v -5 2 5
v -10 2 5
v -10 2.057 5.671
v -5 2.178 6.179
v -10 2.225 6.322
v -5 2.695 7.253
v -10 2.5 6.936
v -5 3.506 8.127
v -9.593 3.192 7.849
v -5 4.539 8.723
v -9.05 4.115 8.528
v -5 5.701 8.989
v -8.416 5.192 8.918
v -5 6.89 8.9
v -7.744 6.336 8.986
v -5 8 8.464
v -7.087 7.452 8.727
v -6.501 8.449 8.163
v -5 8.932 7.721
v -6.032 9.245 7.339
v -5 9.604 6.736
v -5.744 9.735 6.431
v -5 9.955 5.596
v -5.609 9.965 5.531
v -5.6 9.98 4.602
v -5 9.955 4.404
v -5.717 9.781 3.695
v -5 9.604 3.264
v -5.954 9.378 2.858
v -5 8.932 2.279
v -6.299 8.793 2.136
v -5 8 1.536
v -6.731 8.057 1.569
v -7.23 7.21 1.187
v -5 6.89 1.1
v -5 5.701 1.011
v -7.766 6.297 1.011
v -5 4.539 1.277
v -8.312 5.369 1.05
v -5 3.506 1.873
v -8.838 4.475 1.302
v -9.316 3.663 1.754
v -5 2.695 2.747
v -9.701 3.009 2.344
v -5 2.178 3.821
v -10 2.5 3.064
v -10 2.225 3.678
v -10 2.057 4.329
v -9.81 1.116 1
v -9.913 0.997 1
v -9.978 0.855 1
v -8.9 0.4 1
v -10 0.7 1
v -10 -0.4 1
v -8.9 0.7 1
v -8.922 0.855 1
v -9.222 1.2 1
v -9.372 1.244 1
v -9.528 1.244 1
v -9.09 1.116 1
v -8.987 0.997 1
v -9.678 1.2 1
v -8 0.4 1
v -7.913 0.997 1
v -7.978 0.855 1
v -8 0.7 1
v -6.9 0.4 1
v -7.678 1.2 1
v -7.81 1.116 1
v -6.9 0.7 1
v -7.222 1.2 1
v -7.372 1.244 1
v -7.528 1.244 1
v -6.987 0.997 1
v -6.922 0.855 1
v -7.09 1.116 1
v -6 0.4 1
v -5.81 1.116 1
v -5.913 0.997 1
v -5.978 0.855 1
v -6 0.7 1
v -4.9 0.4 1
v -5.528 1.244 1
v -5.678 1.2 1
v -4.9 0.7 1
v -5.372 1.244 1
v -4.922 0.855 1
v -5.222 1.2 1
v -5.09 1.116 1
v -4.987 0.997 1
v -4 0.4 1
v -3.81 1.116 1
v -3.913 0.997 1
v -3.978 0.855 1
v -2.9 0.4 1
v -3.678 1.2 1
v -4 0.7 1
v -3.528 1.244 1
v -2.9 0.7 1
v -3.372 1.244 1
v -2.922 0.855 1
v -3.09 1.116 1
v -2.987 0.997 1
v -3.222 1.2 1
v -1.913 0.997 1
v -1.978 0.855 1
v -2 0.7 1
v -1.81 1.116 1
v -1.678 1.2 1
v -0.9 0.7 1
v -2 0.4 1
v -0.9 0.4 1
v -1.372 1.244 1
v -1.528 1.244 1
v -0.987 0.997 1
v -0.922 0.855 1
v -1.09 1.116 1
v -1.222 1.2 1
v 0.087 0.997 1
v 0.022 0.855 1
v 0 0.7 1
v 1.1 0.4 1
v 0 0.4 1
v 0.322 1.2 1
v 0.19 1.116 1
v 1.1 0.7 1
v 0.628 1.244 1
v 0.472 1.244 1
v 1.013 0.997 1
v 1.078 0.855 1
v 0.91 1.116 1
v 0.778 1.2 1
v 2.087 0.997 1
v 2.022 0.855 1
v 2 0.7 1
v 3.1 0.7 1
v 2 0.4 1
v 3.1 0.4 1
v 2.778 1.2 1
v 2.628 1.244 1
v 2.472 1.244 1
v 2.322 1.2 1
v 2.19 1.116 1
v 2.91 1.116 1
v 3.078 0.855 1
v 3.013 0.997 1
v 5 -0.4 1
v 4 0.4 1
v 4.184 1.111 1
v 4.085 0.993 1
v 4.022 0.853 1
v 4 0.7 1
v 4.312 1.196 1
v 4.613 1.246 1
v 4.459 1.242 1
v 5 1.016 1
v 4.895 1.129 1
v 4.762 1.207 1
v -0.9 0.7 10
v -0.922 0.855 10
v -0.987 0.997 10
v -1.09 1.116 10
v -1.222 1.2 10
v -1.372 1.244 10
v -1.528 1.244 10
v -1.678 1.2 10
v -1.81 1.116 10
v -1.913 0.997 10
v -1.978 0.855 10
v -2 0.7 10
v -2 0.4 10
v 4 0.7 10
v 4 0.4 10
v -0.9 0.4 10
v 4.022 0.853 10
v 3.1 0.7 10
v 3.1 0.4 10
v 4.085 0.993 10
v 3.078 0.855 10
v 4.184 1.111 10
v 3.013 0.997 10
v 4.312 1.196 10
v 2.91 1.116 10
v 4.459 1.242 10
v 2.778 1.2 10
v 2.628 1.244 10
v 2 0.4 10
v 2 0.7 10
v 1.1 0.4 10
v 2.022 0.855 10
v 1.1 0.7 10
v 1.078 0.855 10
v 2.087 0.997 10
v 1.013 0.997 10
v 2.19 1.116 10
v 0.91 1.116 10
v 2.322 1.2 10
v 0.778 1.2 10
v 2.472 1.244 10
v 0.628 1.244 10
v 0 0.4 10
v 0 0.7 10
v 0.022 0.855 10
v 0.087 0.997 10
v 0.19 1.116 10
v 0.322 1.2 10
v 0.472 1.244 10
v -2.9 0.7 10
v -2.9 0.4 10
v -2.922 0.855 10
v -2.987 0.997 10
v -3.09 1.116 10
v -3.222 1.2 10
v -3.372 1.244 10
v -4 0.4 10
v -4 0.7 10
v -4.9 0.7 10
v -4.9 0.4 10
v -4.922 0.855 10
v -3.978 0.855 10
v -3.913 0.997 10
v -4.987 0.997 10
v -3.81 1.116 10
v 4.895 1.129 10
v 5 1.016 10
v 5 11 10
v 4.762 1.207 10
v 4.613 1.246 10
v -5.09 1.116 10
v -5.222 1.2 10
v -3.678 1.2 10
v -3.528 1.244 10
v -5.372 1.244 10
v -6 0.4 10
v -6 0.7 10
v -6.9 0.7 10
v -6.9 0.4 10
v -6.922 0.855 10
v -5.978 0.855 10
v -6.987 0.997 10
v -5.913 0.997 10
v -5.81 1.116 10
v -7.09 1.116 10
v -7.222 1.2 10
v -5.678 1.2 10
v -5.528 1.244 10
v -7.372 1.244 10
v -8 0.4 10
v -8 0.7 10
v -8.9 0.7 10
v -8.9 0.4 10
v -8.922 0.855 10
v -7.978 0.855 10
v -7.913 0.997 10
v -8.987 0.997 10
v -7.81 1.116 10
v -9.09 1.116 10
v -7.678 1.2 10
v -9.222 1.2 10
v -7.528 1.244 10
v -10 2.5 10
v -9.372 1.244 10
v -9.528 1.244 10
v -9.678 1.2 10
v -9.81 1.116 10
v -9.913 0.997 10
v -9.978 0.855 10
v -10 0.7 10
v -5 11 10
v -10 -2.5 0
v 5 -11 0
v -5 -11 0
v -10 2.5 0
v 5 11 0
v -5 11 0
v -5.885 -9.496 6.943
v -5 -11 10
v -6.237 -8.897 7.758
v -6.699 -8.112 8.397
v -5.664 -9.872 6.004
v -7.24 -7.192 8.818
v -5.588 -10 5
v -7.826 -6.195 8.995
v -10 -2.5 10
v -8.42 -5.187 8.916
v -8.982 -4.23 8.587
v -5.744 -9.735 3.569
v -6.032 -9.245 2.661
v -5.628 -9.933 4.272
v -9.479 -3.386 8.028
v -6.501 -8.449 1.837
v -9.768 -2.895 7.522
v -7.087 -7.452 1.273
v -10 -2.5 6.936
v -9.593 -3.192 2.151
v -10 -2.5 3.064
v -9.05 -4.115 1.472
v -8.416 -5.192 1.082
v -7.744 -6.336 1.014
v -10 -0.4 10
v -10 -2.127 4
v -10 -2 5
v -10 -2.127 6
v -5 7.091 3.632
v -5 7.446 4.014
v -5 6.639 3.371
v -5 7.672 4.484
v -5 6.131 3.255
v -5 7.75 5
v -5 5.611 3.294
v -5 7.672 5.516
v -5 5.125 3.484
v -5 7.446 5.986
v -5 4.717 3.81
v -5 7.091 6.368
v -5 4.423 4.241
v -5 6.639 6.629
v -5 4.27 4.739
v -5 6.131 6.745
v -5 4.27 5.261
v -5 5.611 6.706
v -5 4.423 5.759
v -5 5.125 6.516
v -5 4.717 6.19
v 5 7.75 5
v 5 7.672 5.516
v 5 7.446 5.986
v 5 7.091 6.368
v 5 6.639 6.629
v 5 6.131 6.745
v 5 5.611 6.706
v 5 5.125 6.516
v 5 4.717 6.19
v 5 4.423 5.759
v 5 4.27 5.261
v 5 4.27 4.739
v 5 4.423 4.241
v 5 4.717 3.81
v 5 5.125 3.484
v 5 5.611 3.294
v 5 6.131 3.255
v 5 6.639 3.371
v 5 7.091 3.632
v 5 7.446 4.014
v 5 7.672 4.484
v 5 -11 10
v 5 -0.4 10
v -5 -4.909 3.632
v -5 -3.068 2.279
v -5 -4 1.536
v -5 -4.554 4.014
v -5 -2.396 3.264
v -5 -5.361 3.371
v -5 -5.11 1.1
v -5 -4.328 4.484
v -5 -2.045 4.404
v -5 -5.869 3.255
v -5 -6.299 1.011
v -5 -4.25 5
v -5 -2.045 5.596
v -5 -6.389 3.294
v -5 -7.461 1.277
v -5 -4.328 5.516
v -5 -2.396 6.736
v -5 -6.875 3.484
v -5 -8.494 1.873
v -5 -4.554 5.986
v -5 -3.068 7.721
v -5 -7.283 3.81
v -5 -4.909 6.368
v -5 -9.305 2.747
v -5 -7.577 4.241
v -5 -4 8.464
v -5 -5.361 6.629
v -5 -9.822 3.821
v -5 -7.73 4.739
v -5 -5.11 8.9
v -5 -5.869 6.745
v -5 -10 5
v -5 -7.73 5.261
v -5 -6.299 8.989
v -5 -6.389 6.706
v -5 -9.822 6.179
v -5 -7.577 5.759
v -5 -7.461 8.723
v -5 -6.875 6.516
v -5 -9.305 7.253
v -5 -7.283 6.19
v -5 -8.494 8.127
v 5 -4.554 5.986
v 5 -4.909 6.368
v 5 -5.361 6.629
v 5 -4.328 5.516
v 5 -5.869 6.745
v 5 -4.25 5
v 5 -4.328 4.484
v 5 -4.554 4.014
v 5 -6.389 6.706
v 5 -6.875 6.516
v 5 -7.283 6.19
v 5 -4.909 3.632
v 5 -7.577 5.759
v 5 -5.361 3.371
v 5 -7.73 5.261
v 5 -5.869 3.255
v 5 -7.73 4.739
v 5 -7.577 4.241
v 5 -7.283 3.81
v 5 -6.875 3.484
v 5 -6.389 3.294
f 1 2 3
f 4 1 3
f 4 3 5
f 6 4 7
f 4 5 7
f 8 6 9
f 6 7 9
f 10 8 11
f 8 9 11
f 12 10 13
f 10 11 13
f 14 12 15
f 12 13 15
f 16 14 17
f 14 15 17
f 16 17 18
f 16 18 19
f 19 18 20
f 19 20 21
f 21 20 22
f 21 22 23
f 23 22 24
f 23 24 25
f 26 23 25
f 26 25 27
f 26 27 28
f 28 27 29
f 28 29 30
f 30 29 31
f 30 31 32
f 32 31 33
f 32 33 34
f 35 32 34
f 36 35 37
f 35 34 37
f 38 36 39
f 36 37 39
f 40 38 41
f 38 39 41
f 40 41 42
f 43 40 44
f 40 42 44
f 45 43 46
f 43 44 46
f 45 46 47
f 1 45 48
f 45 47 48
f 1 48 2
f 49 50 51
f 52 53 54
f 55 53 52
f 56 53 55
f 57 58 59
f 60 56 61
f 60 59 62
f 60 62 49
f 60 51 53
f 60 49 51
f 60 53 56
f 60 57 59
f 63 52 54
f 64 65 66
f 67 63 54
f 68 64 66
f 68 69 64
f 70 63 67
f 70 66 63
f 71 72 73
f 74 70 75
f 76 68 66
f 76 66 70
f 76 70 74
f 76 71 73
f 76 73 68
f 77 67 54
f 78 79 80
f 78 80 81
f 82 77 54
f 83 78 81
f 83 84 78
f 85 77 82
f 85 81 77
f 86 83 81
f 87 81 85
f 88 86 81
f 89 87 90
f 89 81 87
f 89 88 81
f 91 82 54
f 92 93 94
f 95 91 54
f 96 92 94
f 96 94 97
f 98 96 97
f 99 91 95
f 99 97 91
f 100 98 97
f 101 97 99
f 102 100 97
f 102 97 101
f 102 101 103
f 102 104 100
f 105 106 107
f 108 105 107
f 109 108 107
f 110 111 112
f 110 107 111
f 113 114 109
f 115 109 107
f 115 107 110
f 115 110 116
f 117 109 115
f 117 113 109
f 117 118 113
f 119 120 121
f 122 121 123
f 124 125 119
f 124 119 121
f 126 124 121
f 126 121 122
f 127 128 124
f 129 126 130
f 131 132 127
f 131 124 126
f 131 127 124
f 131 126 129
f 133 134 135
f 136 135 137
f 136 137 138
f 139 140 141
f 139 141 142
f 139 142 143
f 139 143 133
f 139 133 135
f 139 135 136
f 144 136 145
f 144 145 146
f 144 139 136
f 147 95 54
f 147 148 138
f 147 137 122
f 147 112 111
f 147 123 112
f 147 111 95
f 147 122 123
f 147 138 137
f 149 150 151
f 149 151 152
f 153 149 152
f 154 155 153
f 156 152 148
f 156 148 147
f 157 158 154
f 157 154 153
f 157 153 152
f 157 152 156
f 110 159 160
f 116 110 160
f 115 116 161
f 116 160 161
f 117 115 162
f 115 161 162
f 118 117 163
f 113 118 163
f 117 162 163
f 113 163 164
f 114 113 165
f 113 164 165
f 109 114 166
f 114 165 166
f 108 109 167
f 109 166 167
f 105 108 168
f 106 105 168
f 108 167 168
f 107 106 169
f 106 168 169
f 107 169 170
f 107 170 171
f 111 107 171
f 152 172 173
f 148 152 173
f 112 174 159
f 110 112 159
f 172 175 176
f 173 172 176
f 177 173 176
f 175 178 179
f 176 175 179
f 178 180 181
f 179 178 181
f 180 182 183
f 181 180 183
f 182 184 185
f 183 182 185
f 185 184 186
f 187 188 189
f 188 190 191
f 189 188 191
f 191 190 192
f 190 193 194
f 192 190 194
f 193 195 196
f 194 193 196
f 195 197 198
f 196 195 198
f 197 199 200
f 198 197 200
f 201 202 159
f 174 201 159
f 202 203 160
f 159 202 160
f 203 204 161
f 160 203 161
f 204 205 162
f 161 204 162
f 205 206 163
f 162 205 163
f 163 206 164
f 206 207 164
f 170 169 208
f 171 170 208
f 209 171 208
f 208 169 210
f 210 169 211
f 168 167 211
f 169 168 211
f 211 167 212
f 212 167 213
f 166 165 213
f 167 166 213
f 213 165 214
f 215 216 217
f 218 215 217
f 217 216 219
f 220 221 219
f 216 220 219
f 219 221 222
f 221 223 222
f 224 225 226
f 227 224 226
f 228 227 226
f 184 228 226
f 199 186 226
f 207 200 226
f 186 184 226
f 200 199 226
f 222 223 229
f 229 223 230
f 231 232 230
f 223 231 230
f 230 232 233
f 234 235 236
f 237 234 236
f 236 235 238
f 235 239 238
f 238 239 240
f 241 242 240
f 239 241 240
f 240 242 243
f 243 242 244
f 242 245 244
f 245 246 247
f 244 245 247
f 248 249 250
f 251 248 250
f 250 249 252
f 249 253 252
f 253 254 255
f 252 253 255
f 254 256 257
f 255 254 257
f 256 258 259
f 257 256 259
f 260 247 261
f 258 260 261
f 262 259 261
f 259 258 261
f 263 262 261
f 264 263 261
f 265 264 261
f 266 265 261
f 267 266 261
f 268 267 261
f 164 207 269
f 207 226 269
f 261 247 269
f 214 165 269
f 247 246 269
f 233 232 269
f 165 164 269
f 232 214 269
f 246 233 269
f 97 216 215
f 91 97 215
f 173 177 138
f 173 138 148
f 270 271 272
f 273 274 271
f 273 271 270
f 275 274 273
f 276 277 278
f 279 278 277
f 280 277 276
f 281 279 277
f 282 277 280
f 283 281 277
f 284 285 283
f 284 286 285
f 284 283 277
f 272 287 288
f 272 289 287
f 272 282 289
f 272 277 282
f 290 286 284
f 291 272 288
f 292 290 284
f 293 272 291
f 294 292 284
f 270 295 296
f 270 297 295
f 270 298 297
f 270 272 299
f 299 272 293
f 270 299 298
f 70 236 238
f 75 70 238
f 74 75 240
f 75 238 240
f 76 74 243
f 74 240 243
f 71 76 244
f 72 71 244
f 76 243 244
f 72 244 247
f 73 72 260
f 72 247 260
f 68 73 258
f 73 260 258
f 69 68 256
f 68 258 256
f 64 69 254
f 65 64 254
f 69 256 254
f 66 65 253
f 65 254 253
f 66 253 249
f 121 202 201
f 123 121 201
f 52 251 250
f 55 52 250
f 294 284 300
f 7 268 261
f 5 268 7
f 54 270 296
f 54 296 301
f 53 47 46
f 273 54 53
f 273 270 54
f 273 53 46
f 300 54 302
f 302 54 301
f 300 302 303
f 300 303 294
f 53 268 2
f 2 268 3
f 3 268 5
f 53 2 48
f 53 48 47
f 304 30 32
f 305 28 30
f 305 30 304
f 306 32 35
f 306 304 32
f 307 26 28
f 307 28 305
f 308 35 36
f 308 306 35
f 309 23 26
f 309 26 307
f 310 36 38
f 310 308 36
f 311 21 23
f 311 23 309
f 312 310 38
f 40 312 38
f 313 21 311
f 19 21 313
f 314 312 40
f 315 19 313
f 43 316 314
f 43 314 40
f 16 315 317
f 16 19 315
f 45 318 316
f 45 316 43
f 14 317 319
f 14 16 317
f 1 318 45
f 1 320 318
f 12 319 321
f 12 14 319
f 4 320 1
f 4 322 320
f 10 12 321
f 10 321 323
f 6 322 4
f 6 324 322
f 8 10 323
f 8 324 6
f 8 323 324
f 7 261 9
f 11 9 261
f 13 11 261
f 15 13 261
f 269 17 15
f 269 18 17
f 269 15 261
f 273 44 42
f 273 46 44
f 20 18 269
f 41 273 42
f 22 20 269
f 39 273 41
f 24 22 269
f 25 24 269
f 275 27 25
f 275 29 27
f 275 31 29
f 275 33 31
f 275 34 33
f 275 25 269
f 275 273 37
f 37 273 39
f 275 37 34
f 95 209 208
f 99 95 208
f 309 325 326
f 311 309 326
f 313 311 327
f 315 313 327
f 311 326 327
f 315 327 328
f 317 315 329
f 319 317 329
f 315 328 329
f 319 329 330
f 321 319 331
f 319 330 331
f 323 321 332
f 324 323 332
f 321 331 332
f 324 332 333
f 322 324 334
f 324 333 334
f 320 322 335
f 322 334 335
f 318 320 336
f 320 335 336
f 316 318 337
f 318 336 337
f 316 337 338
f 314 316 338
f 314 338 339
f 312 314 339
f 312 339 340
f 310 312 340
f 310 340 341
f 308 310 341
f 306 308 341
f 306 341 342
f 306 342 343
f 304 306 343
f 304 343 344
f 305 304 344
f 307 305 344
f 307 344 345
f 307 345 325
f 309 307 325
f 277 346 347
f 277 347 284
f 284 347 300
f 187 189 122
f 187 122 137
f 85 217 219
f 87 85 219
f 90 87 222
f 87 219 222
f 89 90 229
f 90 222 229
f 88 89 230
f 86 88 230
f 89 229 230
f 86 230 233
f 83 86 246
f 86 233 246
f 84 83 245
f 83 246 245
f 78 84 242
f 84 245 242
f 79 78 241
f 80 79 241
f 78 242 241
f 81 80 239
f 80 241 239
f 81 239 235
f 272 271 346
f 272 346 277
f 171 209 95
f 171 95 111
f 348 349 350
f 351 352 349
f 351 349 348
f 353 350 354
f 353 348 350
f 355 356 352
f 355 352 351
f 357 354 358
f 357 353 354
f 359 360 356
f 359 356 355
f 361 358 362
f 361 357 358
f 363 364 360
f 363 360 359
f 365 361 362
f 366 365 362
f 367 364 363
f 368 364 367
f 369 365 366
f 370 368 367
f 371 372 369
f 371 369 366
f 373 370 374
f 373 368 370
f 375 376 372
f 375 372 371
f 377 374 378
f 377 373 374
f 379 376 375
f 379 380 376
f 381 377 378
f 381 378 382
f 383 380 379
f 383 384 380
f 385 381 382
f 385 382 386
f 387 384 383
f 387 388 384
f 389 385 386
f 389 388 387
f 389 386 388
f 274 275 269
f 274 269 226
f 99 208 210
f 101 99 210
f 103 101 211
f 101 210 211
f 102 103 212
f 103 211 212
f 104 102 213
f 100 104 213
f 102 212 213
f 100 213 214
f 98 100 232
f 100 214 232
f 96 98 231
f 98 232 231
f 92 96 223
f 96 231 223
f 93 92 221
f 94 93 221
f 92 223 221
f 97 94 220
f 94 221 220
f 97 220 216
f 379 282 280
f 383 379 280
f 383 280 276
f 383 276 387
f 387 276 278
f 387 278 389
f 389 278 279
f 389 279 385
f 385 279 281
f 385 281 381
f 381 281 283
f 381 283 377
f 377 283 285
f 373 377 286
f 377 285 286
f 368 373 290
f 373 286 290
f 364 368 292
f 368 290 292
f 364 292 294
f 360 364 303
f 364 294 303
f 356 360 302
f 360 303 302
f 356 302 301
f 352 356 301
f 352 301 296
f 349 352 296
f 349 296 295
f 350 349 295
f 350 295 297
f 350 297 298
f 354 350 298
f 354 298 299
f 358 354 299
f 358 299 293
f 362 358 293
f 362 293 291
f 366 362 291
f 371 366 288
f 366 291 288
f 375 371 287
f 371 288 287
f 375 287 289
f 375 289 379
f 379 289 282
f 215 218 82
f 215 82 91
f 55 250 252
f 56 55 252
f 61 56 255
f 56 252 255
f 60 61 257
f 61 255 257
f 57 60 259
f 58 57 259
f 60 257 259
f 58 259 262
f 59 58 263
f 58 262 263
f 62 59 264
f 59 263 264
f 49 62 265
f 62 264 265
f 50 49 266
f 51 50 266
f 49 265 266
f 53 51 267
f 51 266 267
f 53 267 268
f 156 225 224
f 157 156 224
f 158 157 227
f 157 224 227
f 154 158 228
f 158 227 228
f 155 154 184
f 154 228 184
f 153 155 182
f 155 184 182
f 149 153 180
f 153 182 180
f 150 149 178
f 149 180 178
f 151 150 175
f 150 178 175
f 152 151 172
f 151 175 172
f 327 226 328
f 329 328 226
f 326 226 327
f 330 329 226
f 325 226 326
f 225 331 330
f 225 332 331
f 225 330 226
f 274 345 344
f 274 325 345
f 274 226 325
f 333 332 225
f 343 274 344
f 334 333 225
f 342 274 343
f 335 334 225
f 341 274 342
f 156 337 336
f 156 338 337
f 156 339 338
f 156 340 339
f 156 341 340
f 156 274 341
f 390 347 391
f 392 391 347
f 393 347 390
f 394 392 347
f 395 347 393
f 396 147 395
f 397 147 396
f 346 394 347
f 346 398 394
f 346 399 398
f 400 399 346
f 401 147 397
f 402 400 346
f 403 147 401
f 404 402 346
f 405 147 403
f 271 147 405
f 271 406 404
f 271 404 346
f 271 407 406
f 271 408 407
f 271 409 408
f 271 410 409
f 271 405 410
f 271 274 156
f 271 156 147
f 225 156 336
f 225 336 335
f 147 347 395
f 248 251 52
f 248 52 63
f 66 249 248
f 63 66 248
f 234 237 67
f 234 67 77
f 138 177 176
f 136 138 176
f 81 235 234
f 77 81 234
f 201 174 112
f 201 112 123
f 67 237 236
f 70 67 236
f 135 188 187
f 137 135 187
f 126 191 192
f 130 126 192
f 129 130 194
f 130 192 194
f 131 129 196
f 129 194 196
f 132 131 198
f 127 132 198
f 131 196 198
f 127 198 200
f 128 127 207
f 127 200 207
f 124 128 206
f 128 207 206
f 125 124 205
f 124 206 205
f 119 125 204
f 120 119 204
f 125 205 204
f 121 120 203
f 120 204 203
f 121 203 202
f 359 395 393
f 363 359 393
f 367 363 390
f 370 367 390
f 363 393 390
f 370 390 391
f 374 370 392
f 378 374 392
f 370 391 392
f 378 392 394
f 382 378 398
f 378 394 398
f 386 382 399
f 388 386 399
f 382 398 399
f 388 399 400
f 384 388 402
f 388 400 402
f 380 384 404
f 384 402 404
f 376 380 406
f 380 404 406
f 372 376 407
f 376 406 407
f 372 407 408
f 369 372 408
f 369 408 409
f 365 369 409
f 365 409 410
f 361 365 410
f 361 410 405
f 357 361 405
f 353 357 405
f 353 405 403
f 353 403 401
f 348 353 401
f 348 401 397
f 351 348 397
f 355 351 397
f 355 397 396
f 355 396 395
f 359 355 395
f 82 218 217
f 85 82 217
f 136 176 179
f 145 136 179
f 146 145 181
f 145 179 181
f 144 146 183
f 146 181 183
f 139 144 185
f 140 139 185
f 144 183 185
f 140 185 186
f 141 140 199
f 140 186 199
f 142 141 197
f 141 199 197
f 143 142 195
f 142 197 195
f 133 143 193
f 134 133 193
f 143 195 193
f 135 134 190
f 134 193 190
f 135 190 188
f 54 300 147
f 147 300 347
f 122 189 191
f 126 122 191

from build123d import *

# Parameters (mm, degrees)
PAD_DEPTH           = 10
SKETCH001_R         = 1.75
POCKET_DEPTH        = 15.001
SKETCH002_R         = 4
POCKET001_DEPTH     = 5
SKETCH004_W         = 15
SKETCH004_H         = 0.8
POCKET002_DEPTH     = 9
POCKET003_DEPTH     = 9
LINEARPATTERN_COUNT = 8
LINEARPATTERN_PITCH = 2


with BuildPart() as part:
    # Sketch → Pad (new body)
    with BuildSketch(Plane.XY):
        Polygon((-5, 11), (5, 11), (5, -11), (-5, -11), (-10, -2.5), (-10, 2.5), align=None)
    extrude(amount=PAD_DEPTH)

    # Sketch001 → Pocket (cut, through all)
    with BuildSketch(Plane.YZ.offset(5)):
        with Locations((-6, 5)):
            Circle(SKETCH001_R)
        with Locations((6, 5)):
            Circle(SKETCH001_R)
    extrude(amount=-POCKET_DEPTH, mode=Mode.SUBTRACT)

    # Sketch002 → Pocket001 (cut)
    with BuildSketch(Plane(origin=(-10, 0, 0), x_dir=(0, -1, 0), z_dir=(-1, 0, 0))):
        with Locations((-6, 5)):
            Circle(SKETCH002_R)
        with Locations((6, 5)):
            Circle(SKETCH002_R)
    extrude(amount=-POCKET001_DEPTH, mode=Mode.SUBTRACT)

    # Sketch004 → Pocket002 (cut)
    with BuildSketch(Plane.XY.offset(10)):
        with Locations((-2.5, 0)):
            Rectangle(SKETCH004_W, SKETCH004_H)
    extrude(amount=-POCKET002_DEPTH, mode=Mode.SUBTRACT)

    # Sketch003 → Pocket003 (cut)
    with BuildSketch(Plane.XY.offset(10)):
        with BuildLine():
            ThreePointArc((-8.9, 0.7), (-9.45, 1.25), (-10, 0.7))
            Line((-10, 0.7), (-10, 0.4))
            Line((-10, 0.4), (-8.9, 0.4))
            Line((-8.9, 0.4), (-8.9, 0.7))
        make_face()
    pocket003 = extrude(amount=-POCKET003_DEPTH, mode=Mode.SUBTRACT)

    # LinearPattern: Pocket003 ×8
    with Locations(*[(i * LINEARPATTERN_PITCH, 0, 0) for i in range(1, LINEARPATTERN_COUNT)]):
        add(pocket003, mode=Mode.SUBTRACT)


solid = part.part
